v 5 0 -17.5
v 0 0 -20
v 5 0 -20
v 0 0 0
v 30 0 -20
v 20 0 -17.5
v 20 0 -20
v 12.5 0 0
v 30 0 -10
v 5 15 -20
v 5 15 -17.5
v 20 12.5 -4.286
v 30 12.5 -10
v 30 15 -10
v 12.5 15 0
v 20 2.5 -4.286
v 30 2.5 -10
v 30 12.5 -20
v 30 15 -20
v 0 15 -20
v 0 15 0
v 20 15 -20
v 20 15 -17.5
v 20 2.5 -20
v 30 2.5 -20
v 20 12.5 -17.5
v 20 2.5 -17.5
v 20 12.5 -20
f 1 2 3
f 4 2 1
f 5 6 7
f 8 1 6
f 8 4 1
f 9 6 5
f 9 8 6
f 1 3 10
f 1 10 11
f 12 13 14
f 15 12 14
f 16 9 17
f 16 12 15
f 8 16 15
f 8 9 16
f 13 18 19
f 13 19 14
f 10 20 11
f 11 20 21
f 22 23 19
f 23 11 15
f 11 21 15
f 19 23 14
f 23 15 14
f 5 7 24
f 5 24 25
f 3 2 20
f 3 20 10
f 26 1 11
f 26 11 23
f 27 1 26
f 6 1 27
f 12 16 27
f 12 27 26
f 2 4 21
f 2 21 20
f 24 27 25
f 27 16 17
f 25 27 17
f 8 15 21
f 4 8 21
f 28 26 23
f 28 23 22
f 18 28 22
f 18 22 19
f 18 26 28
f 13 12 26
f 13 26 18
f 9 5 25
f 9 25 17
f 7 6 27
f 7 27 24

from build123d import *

# Parameters (mm, degrees)
F1_DEPTH = 15
F2_W     = 10
F2_H     = 10
F3_DEPTH = 25


with BuildPart() as f1:
    # F0 (on Front) → F1 (new body)
    with BuildSketch(Plane.XZ):
        Polygon((12.5, 0), (0, 0), (0, -20), (5, -20), (5, -17.5), (20, -17.5), (20, -20), (30, -20), (30, -10), align=None)
    extrude(amount=-F1_DEPTH)

    # F2 (on face) → F3 (cut)
    with BuildSketch(Plane.XY):
        with Locations((25, 7.5)):
            Rectangle(F2_W, F2_H)
    extrude(amount=-F3_DEPTH, mode=Mode.SUBTRACT)


solid = f1.part
